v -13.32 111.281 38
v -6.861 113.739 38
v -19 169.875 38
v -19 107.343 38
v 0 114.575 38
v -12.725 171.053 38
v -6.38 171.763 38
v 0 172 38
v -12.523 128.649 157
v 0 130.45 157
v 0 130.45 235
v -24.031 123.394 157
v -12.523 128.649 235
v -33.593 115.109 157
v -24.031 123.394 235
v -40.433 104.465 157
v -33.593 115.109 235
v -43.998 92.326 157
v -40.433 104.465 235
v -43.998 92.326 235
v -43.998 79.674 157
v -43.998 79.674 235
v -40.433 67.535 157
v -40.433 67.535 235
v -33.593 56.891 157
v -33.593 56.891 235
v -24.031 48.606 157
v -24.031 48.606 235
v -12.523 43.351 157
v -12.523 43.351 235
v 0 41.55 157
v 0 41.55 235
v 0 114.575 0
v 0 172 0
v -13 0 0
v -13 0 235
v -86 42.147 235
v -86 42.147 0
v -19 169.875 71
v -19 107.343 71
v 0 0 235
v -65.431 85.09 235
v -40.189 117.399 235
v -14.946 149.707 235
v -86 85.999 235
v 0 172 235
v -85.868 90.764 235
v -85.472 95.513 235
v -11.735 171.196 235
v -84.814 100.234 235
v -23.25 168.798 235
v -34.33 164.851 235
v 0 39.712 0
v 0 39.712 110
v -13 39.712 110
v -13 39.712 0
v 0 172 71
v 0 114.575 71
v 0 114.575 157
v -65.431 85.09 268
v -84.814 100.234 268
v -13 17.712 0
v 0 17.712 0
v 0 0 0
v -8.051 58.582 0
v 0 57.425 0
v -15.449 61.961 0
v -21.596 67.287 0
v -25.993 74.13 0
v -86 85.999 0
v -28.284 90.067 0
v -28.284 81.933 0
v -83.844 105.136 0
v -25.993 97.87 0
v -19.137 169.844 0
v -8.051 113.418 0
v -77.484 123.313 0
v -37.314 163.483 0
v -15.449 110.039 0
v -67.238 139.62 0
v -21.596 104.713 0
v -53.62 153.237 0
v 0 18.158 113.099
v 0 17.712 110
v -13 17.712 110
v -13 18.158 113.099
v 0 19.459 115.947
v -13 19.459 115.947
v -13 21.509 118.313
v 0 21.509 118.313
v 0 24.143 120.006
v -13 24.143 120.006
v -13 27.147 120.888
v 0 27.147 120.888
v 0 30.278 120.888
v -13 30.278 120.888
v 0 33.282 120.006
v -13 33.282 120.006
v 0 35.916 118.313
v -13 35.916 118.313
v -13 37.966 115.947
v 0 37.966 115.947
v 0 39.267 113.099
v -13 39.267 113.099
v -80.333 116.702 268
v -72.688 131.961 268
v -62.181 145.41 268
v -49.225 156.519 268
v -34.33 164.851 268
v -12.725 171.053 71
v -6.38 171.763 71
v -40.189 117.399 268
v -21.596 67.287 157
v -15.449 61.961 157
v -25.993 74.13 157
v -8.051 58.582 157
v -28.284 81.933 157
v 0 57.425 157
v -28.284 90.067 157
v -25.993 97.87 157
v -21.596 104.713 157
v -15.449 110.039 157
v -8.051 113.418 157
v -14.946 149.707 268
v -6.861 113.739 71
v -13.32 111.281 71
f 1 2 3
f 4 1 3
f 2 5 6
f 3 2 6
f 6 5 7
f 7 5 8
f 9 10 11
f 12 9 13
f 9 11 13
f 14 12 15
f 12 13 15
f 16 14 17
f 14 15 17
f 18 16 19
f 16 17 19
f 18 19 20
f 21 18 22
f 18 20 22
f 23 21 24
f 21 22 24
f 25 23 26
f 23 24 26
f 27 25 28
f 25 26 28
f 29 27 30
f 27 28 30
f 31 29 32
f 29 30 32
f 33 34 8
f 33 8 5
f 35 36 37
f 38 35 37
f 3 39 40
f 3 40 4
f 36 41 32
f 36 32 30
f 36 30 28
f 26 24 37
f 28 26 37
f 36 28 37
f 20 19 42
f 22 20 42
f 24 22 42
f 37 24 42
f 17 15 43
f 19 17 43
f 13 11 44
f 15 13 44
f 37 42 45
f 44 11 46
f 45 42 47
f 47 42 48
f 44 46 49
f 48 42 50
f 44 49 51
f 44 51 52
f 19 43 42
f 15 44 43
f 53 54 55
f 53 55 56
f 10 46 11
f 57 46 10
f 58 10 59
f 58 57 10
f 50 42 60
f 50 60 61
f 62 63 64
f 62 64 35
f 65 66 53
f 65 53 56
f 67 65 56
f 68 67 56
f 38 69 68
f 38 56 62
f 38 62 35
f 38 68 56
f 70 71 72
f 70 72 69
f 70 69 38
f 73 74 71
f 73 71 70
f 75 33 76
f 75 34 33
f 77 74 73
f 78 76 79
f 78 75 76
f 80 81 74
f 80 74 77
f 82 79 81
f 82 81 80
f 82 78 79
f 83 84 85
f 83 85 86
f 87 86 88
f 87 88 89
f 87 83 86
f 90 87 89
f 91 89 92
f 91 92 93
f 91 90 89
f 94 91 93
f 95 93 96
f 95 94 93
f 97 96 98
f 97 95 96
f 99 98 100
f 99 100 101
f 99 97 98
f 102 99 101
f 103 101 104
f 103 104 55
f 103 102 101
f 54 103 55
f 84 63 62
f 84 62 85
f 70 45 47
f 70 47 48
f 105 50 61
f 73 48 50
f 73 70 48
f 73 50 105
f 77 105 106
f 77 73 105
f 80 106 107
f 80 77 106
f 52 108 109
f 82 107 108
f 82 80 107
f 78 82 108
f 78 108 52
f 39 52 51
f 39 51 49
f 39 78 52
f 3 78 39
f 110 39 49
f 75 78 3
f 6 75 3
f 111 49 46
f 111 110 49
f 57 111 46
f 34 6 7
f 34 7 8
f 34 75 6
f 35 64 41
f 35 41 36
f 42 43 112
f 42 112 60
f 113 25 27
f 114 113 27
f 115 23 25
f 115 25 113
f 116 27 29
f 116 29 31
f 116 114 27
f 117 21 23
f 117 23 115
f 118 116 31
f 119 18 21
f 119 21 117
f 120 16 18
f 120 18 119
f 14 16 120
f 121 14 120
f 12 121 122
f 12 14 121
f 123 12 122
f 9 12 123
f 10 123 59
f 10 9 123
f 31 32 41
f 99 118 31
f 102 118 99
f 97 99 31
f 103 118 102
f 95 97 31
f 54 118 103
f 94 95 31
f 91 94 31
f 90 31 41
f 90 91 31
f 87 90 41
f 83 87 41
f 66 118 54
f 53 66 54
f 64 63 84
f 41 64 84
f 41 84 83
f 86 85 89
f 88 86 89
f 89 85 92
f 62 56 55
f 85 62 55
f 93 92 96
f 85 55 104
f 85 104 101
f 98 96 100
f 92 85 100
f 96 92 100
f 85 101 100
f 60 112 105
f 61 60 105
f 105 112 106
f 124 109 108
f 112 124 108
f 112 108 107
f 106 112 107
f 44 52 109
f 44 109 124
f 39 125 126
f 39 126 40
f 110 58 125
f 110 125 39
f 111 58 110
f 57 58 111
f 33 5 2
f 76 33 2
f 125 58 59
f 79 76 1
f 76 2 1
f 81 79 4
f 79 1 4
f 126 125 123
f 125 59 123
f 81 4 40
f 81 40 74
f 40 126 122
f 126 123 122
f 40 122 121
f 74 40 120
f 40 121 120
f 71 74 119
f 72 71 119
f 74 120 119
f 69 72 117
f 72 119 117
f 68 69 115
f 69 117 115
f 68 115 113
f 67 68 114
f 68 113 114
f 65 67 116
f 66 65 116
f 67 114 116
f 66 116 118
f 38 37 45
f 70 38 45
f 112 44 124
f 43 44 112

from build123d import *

# Parameters (mm, degrees)
BOSS_EXTRU_2_DEPTH           = 235
ESQUISSE2_R                  = 44.45
ENL_V_MAT_EXTRU_1_DEPTH      = 78
ESQUISSE3_R                  = 28.575
ENL_V_MAT_EXTRU_2_DEPTH      = 190
ENL_V_MAT_EXTRU_3_DEPTH      = 13
BOSS_EXTRU_3_DEPTH           = 111
ESQUISSE10_W                 = 33
ESQUISSE10_H                 = 39.549429839
ENL_V_MAT_EXTRU_5_DEPTH      = 19
ENL_V_MAT_EXTRU_6_REACH      = 313.068
ENL_V_MAT_EXTRU_6_END_RADIUS = 28.575
ESQUISSE11_W                 = 19
ESQUISSE11_H                 = 33


with BuildPart() as part:
    # Esquisse1 → Boss.-Extru.2 (new body)
    with BuildSketch(Plane.XY):
        with BuildLine():
            Line((0, 0), (-13, 0))
            Line((-13, 0), (-86, 42.146569651))
            Line((-86, 42.146569651), (-86, 85.999071056))
            ThreePointArc((-86, 85.999071056), (-60.811511616, 146.810854752), (0, 172))
            Line((0, 172), (0, 0))
        make_face()
    extrude(amount=BOSS_EXTRU_2_DEPTH)

    # Esquisse2 → Enlèv. mat.-Extru.1 (cut)
    with BuildSketch(Plane.XY.offset(235)):
        with Locations((0, 86)):
            Circle(ESQUISSE2_R)
    extrude(amount=-ENL_V_MAT_EXTRU_1_DEPTH, mode=Mode.SUBTRACT)

    # Esquisse3 → Enlèv. mat.-Extru.2 (cut)
    with BuildSketch(Plane.XY.offset(157)):
        with Locations((0, 86)):
            Circle(ESQUISSE3_R)
    extrude(amount=-ENL_V_MAT_EXTRU_2_DEPTH, mode=Mode.SUBTRACT)

    # Esquisse4 → Enlèv. mat.-Extru.3 (cut)
    with BuildSketch(Plane(origin=(0, 0, 0), x_dir=(0, 0, -1), z_dir=(1, 0, 0))):
        with BuildLine():
            Line((0, 17.7125), (-110, 17.7125))
            ThreePointArc((-110, 17.7125), (-121, 28.7125), (-110, 39.7125))
            Line((-110, 39.7125), (0, 39.7125))
            ThreePointArc((0, 39.7125), (11, 28.7125), (0, 17.7125))
        make_face()
    extrude(amount=-ENL_V_MAT_EXTRU_3_DEPTH, mode=Mode.SUBTRACT)

    # Esquisse7 → Boss.-Extru.3 (add)
    with BuildSketch(Plane.XY.offset(157)):
        with BuildLine():
            Line((-34.329616244, 164.850982549), (-14.946427951, 149.707176139))
            Line((-14.946427951, 149.707176139), (-40.188548439, 117.398735242))
            Line((-40.188548439, 117.398735242), (-65.430668927, 85.090294344))
            Line((-65.430668927, 85.090294344), (-84.81385722, 100.234100753))
            ThreePointArc((-84.81385722, 100.234100753), (-67.768924815, 138.946886878), (-34.329616244, 164.850982549))
        make_face()
    extrude(amount=BOSS_EXTRU_3_DEPTH)

    # Esquisse10 → Enlèv. mat.-Extru.5 (cut)
    with BuildSketch(Plane(origin=(0, 0, 0), x_dir=(0, 0, -1), z_dir=(1, 0, 0))):
        with Locations((-54.5, 152.22528508)):
            Rectangle(ESQUISSE10_W, ESQUISSE10_H)
    extrude(amount=-ENL_V_MAT_EXTRU_5_DEPTH, mode=Mode.SUBTRACT)

    # Enlèv. mat.-Extru.6: up to this cylinder (the profile starts outside it)
    enl_v_mat_extru_6_end = Plane(origin=(0, 86, 54.5), z_dir=(0, 0, 1)) * Cylinder(ENL_V_MAT_EXTRU_6_END_RADIUS, 684.286, mode=Mode.PRIVATE)
    # Esquisse11 → Enlèv. mat.-Extru.6 (cut, up to the surface)
    with BuildSketch(Plane(origin=(0, 132.450570161, 0), x_dir=(1, 0, 0), z_dir=(0, 1, 0)), mode=Mode.PRIVATE) as enl_v_mat_extru_6_sk1:
        with Locations((-9.5, -54.5)):
            Rectangle(ESQUISSE11_W, ESQUISSE11_H)
    enl_v_mat_extru_6_tool1 = extrude(enl_v_mat_extru_6_sk1.sketch, amount=-ENL_V_MAT_EXTRU_6_REACH, mode=Mode.PRIVATE) - enl_v_mat_extru_6_end
    add(enl_v_mat_extru_6_tool1.solids().sort_by_distance((-9.5, 132.45057, 54.5))[0], mode=Mode.SUBTRACT)


solid = part.part
